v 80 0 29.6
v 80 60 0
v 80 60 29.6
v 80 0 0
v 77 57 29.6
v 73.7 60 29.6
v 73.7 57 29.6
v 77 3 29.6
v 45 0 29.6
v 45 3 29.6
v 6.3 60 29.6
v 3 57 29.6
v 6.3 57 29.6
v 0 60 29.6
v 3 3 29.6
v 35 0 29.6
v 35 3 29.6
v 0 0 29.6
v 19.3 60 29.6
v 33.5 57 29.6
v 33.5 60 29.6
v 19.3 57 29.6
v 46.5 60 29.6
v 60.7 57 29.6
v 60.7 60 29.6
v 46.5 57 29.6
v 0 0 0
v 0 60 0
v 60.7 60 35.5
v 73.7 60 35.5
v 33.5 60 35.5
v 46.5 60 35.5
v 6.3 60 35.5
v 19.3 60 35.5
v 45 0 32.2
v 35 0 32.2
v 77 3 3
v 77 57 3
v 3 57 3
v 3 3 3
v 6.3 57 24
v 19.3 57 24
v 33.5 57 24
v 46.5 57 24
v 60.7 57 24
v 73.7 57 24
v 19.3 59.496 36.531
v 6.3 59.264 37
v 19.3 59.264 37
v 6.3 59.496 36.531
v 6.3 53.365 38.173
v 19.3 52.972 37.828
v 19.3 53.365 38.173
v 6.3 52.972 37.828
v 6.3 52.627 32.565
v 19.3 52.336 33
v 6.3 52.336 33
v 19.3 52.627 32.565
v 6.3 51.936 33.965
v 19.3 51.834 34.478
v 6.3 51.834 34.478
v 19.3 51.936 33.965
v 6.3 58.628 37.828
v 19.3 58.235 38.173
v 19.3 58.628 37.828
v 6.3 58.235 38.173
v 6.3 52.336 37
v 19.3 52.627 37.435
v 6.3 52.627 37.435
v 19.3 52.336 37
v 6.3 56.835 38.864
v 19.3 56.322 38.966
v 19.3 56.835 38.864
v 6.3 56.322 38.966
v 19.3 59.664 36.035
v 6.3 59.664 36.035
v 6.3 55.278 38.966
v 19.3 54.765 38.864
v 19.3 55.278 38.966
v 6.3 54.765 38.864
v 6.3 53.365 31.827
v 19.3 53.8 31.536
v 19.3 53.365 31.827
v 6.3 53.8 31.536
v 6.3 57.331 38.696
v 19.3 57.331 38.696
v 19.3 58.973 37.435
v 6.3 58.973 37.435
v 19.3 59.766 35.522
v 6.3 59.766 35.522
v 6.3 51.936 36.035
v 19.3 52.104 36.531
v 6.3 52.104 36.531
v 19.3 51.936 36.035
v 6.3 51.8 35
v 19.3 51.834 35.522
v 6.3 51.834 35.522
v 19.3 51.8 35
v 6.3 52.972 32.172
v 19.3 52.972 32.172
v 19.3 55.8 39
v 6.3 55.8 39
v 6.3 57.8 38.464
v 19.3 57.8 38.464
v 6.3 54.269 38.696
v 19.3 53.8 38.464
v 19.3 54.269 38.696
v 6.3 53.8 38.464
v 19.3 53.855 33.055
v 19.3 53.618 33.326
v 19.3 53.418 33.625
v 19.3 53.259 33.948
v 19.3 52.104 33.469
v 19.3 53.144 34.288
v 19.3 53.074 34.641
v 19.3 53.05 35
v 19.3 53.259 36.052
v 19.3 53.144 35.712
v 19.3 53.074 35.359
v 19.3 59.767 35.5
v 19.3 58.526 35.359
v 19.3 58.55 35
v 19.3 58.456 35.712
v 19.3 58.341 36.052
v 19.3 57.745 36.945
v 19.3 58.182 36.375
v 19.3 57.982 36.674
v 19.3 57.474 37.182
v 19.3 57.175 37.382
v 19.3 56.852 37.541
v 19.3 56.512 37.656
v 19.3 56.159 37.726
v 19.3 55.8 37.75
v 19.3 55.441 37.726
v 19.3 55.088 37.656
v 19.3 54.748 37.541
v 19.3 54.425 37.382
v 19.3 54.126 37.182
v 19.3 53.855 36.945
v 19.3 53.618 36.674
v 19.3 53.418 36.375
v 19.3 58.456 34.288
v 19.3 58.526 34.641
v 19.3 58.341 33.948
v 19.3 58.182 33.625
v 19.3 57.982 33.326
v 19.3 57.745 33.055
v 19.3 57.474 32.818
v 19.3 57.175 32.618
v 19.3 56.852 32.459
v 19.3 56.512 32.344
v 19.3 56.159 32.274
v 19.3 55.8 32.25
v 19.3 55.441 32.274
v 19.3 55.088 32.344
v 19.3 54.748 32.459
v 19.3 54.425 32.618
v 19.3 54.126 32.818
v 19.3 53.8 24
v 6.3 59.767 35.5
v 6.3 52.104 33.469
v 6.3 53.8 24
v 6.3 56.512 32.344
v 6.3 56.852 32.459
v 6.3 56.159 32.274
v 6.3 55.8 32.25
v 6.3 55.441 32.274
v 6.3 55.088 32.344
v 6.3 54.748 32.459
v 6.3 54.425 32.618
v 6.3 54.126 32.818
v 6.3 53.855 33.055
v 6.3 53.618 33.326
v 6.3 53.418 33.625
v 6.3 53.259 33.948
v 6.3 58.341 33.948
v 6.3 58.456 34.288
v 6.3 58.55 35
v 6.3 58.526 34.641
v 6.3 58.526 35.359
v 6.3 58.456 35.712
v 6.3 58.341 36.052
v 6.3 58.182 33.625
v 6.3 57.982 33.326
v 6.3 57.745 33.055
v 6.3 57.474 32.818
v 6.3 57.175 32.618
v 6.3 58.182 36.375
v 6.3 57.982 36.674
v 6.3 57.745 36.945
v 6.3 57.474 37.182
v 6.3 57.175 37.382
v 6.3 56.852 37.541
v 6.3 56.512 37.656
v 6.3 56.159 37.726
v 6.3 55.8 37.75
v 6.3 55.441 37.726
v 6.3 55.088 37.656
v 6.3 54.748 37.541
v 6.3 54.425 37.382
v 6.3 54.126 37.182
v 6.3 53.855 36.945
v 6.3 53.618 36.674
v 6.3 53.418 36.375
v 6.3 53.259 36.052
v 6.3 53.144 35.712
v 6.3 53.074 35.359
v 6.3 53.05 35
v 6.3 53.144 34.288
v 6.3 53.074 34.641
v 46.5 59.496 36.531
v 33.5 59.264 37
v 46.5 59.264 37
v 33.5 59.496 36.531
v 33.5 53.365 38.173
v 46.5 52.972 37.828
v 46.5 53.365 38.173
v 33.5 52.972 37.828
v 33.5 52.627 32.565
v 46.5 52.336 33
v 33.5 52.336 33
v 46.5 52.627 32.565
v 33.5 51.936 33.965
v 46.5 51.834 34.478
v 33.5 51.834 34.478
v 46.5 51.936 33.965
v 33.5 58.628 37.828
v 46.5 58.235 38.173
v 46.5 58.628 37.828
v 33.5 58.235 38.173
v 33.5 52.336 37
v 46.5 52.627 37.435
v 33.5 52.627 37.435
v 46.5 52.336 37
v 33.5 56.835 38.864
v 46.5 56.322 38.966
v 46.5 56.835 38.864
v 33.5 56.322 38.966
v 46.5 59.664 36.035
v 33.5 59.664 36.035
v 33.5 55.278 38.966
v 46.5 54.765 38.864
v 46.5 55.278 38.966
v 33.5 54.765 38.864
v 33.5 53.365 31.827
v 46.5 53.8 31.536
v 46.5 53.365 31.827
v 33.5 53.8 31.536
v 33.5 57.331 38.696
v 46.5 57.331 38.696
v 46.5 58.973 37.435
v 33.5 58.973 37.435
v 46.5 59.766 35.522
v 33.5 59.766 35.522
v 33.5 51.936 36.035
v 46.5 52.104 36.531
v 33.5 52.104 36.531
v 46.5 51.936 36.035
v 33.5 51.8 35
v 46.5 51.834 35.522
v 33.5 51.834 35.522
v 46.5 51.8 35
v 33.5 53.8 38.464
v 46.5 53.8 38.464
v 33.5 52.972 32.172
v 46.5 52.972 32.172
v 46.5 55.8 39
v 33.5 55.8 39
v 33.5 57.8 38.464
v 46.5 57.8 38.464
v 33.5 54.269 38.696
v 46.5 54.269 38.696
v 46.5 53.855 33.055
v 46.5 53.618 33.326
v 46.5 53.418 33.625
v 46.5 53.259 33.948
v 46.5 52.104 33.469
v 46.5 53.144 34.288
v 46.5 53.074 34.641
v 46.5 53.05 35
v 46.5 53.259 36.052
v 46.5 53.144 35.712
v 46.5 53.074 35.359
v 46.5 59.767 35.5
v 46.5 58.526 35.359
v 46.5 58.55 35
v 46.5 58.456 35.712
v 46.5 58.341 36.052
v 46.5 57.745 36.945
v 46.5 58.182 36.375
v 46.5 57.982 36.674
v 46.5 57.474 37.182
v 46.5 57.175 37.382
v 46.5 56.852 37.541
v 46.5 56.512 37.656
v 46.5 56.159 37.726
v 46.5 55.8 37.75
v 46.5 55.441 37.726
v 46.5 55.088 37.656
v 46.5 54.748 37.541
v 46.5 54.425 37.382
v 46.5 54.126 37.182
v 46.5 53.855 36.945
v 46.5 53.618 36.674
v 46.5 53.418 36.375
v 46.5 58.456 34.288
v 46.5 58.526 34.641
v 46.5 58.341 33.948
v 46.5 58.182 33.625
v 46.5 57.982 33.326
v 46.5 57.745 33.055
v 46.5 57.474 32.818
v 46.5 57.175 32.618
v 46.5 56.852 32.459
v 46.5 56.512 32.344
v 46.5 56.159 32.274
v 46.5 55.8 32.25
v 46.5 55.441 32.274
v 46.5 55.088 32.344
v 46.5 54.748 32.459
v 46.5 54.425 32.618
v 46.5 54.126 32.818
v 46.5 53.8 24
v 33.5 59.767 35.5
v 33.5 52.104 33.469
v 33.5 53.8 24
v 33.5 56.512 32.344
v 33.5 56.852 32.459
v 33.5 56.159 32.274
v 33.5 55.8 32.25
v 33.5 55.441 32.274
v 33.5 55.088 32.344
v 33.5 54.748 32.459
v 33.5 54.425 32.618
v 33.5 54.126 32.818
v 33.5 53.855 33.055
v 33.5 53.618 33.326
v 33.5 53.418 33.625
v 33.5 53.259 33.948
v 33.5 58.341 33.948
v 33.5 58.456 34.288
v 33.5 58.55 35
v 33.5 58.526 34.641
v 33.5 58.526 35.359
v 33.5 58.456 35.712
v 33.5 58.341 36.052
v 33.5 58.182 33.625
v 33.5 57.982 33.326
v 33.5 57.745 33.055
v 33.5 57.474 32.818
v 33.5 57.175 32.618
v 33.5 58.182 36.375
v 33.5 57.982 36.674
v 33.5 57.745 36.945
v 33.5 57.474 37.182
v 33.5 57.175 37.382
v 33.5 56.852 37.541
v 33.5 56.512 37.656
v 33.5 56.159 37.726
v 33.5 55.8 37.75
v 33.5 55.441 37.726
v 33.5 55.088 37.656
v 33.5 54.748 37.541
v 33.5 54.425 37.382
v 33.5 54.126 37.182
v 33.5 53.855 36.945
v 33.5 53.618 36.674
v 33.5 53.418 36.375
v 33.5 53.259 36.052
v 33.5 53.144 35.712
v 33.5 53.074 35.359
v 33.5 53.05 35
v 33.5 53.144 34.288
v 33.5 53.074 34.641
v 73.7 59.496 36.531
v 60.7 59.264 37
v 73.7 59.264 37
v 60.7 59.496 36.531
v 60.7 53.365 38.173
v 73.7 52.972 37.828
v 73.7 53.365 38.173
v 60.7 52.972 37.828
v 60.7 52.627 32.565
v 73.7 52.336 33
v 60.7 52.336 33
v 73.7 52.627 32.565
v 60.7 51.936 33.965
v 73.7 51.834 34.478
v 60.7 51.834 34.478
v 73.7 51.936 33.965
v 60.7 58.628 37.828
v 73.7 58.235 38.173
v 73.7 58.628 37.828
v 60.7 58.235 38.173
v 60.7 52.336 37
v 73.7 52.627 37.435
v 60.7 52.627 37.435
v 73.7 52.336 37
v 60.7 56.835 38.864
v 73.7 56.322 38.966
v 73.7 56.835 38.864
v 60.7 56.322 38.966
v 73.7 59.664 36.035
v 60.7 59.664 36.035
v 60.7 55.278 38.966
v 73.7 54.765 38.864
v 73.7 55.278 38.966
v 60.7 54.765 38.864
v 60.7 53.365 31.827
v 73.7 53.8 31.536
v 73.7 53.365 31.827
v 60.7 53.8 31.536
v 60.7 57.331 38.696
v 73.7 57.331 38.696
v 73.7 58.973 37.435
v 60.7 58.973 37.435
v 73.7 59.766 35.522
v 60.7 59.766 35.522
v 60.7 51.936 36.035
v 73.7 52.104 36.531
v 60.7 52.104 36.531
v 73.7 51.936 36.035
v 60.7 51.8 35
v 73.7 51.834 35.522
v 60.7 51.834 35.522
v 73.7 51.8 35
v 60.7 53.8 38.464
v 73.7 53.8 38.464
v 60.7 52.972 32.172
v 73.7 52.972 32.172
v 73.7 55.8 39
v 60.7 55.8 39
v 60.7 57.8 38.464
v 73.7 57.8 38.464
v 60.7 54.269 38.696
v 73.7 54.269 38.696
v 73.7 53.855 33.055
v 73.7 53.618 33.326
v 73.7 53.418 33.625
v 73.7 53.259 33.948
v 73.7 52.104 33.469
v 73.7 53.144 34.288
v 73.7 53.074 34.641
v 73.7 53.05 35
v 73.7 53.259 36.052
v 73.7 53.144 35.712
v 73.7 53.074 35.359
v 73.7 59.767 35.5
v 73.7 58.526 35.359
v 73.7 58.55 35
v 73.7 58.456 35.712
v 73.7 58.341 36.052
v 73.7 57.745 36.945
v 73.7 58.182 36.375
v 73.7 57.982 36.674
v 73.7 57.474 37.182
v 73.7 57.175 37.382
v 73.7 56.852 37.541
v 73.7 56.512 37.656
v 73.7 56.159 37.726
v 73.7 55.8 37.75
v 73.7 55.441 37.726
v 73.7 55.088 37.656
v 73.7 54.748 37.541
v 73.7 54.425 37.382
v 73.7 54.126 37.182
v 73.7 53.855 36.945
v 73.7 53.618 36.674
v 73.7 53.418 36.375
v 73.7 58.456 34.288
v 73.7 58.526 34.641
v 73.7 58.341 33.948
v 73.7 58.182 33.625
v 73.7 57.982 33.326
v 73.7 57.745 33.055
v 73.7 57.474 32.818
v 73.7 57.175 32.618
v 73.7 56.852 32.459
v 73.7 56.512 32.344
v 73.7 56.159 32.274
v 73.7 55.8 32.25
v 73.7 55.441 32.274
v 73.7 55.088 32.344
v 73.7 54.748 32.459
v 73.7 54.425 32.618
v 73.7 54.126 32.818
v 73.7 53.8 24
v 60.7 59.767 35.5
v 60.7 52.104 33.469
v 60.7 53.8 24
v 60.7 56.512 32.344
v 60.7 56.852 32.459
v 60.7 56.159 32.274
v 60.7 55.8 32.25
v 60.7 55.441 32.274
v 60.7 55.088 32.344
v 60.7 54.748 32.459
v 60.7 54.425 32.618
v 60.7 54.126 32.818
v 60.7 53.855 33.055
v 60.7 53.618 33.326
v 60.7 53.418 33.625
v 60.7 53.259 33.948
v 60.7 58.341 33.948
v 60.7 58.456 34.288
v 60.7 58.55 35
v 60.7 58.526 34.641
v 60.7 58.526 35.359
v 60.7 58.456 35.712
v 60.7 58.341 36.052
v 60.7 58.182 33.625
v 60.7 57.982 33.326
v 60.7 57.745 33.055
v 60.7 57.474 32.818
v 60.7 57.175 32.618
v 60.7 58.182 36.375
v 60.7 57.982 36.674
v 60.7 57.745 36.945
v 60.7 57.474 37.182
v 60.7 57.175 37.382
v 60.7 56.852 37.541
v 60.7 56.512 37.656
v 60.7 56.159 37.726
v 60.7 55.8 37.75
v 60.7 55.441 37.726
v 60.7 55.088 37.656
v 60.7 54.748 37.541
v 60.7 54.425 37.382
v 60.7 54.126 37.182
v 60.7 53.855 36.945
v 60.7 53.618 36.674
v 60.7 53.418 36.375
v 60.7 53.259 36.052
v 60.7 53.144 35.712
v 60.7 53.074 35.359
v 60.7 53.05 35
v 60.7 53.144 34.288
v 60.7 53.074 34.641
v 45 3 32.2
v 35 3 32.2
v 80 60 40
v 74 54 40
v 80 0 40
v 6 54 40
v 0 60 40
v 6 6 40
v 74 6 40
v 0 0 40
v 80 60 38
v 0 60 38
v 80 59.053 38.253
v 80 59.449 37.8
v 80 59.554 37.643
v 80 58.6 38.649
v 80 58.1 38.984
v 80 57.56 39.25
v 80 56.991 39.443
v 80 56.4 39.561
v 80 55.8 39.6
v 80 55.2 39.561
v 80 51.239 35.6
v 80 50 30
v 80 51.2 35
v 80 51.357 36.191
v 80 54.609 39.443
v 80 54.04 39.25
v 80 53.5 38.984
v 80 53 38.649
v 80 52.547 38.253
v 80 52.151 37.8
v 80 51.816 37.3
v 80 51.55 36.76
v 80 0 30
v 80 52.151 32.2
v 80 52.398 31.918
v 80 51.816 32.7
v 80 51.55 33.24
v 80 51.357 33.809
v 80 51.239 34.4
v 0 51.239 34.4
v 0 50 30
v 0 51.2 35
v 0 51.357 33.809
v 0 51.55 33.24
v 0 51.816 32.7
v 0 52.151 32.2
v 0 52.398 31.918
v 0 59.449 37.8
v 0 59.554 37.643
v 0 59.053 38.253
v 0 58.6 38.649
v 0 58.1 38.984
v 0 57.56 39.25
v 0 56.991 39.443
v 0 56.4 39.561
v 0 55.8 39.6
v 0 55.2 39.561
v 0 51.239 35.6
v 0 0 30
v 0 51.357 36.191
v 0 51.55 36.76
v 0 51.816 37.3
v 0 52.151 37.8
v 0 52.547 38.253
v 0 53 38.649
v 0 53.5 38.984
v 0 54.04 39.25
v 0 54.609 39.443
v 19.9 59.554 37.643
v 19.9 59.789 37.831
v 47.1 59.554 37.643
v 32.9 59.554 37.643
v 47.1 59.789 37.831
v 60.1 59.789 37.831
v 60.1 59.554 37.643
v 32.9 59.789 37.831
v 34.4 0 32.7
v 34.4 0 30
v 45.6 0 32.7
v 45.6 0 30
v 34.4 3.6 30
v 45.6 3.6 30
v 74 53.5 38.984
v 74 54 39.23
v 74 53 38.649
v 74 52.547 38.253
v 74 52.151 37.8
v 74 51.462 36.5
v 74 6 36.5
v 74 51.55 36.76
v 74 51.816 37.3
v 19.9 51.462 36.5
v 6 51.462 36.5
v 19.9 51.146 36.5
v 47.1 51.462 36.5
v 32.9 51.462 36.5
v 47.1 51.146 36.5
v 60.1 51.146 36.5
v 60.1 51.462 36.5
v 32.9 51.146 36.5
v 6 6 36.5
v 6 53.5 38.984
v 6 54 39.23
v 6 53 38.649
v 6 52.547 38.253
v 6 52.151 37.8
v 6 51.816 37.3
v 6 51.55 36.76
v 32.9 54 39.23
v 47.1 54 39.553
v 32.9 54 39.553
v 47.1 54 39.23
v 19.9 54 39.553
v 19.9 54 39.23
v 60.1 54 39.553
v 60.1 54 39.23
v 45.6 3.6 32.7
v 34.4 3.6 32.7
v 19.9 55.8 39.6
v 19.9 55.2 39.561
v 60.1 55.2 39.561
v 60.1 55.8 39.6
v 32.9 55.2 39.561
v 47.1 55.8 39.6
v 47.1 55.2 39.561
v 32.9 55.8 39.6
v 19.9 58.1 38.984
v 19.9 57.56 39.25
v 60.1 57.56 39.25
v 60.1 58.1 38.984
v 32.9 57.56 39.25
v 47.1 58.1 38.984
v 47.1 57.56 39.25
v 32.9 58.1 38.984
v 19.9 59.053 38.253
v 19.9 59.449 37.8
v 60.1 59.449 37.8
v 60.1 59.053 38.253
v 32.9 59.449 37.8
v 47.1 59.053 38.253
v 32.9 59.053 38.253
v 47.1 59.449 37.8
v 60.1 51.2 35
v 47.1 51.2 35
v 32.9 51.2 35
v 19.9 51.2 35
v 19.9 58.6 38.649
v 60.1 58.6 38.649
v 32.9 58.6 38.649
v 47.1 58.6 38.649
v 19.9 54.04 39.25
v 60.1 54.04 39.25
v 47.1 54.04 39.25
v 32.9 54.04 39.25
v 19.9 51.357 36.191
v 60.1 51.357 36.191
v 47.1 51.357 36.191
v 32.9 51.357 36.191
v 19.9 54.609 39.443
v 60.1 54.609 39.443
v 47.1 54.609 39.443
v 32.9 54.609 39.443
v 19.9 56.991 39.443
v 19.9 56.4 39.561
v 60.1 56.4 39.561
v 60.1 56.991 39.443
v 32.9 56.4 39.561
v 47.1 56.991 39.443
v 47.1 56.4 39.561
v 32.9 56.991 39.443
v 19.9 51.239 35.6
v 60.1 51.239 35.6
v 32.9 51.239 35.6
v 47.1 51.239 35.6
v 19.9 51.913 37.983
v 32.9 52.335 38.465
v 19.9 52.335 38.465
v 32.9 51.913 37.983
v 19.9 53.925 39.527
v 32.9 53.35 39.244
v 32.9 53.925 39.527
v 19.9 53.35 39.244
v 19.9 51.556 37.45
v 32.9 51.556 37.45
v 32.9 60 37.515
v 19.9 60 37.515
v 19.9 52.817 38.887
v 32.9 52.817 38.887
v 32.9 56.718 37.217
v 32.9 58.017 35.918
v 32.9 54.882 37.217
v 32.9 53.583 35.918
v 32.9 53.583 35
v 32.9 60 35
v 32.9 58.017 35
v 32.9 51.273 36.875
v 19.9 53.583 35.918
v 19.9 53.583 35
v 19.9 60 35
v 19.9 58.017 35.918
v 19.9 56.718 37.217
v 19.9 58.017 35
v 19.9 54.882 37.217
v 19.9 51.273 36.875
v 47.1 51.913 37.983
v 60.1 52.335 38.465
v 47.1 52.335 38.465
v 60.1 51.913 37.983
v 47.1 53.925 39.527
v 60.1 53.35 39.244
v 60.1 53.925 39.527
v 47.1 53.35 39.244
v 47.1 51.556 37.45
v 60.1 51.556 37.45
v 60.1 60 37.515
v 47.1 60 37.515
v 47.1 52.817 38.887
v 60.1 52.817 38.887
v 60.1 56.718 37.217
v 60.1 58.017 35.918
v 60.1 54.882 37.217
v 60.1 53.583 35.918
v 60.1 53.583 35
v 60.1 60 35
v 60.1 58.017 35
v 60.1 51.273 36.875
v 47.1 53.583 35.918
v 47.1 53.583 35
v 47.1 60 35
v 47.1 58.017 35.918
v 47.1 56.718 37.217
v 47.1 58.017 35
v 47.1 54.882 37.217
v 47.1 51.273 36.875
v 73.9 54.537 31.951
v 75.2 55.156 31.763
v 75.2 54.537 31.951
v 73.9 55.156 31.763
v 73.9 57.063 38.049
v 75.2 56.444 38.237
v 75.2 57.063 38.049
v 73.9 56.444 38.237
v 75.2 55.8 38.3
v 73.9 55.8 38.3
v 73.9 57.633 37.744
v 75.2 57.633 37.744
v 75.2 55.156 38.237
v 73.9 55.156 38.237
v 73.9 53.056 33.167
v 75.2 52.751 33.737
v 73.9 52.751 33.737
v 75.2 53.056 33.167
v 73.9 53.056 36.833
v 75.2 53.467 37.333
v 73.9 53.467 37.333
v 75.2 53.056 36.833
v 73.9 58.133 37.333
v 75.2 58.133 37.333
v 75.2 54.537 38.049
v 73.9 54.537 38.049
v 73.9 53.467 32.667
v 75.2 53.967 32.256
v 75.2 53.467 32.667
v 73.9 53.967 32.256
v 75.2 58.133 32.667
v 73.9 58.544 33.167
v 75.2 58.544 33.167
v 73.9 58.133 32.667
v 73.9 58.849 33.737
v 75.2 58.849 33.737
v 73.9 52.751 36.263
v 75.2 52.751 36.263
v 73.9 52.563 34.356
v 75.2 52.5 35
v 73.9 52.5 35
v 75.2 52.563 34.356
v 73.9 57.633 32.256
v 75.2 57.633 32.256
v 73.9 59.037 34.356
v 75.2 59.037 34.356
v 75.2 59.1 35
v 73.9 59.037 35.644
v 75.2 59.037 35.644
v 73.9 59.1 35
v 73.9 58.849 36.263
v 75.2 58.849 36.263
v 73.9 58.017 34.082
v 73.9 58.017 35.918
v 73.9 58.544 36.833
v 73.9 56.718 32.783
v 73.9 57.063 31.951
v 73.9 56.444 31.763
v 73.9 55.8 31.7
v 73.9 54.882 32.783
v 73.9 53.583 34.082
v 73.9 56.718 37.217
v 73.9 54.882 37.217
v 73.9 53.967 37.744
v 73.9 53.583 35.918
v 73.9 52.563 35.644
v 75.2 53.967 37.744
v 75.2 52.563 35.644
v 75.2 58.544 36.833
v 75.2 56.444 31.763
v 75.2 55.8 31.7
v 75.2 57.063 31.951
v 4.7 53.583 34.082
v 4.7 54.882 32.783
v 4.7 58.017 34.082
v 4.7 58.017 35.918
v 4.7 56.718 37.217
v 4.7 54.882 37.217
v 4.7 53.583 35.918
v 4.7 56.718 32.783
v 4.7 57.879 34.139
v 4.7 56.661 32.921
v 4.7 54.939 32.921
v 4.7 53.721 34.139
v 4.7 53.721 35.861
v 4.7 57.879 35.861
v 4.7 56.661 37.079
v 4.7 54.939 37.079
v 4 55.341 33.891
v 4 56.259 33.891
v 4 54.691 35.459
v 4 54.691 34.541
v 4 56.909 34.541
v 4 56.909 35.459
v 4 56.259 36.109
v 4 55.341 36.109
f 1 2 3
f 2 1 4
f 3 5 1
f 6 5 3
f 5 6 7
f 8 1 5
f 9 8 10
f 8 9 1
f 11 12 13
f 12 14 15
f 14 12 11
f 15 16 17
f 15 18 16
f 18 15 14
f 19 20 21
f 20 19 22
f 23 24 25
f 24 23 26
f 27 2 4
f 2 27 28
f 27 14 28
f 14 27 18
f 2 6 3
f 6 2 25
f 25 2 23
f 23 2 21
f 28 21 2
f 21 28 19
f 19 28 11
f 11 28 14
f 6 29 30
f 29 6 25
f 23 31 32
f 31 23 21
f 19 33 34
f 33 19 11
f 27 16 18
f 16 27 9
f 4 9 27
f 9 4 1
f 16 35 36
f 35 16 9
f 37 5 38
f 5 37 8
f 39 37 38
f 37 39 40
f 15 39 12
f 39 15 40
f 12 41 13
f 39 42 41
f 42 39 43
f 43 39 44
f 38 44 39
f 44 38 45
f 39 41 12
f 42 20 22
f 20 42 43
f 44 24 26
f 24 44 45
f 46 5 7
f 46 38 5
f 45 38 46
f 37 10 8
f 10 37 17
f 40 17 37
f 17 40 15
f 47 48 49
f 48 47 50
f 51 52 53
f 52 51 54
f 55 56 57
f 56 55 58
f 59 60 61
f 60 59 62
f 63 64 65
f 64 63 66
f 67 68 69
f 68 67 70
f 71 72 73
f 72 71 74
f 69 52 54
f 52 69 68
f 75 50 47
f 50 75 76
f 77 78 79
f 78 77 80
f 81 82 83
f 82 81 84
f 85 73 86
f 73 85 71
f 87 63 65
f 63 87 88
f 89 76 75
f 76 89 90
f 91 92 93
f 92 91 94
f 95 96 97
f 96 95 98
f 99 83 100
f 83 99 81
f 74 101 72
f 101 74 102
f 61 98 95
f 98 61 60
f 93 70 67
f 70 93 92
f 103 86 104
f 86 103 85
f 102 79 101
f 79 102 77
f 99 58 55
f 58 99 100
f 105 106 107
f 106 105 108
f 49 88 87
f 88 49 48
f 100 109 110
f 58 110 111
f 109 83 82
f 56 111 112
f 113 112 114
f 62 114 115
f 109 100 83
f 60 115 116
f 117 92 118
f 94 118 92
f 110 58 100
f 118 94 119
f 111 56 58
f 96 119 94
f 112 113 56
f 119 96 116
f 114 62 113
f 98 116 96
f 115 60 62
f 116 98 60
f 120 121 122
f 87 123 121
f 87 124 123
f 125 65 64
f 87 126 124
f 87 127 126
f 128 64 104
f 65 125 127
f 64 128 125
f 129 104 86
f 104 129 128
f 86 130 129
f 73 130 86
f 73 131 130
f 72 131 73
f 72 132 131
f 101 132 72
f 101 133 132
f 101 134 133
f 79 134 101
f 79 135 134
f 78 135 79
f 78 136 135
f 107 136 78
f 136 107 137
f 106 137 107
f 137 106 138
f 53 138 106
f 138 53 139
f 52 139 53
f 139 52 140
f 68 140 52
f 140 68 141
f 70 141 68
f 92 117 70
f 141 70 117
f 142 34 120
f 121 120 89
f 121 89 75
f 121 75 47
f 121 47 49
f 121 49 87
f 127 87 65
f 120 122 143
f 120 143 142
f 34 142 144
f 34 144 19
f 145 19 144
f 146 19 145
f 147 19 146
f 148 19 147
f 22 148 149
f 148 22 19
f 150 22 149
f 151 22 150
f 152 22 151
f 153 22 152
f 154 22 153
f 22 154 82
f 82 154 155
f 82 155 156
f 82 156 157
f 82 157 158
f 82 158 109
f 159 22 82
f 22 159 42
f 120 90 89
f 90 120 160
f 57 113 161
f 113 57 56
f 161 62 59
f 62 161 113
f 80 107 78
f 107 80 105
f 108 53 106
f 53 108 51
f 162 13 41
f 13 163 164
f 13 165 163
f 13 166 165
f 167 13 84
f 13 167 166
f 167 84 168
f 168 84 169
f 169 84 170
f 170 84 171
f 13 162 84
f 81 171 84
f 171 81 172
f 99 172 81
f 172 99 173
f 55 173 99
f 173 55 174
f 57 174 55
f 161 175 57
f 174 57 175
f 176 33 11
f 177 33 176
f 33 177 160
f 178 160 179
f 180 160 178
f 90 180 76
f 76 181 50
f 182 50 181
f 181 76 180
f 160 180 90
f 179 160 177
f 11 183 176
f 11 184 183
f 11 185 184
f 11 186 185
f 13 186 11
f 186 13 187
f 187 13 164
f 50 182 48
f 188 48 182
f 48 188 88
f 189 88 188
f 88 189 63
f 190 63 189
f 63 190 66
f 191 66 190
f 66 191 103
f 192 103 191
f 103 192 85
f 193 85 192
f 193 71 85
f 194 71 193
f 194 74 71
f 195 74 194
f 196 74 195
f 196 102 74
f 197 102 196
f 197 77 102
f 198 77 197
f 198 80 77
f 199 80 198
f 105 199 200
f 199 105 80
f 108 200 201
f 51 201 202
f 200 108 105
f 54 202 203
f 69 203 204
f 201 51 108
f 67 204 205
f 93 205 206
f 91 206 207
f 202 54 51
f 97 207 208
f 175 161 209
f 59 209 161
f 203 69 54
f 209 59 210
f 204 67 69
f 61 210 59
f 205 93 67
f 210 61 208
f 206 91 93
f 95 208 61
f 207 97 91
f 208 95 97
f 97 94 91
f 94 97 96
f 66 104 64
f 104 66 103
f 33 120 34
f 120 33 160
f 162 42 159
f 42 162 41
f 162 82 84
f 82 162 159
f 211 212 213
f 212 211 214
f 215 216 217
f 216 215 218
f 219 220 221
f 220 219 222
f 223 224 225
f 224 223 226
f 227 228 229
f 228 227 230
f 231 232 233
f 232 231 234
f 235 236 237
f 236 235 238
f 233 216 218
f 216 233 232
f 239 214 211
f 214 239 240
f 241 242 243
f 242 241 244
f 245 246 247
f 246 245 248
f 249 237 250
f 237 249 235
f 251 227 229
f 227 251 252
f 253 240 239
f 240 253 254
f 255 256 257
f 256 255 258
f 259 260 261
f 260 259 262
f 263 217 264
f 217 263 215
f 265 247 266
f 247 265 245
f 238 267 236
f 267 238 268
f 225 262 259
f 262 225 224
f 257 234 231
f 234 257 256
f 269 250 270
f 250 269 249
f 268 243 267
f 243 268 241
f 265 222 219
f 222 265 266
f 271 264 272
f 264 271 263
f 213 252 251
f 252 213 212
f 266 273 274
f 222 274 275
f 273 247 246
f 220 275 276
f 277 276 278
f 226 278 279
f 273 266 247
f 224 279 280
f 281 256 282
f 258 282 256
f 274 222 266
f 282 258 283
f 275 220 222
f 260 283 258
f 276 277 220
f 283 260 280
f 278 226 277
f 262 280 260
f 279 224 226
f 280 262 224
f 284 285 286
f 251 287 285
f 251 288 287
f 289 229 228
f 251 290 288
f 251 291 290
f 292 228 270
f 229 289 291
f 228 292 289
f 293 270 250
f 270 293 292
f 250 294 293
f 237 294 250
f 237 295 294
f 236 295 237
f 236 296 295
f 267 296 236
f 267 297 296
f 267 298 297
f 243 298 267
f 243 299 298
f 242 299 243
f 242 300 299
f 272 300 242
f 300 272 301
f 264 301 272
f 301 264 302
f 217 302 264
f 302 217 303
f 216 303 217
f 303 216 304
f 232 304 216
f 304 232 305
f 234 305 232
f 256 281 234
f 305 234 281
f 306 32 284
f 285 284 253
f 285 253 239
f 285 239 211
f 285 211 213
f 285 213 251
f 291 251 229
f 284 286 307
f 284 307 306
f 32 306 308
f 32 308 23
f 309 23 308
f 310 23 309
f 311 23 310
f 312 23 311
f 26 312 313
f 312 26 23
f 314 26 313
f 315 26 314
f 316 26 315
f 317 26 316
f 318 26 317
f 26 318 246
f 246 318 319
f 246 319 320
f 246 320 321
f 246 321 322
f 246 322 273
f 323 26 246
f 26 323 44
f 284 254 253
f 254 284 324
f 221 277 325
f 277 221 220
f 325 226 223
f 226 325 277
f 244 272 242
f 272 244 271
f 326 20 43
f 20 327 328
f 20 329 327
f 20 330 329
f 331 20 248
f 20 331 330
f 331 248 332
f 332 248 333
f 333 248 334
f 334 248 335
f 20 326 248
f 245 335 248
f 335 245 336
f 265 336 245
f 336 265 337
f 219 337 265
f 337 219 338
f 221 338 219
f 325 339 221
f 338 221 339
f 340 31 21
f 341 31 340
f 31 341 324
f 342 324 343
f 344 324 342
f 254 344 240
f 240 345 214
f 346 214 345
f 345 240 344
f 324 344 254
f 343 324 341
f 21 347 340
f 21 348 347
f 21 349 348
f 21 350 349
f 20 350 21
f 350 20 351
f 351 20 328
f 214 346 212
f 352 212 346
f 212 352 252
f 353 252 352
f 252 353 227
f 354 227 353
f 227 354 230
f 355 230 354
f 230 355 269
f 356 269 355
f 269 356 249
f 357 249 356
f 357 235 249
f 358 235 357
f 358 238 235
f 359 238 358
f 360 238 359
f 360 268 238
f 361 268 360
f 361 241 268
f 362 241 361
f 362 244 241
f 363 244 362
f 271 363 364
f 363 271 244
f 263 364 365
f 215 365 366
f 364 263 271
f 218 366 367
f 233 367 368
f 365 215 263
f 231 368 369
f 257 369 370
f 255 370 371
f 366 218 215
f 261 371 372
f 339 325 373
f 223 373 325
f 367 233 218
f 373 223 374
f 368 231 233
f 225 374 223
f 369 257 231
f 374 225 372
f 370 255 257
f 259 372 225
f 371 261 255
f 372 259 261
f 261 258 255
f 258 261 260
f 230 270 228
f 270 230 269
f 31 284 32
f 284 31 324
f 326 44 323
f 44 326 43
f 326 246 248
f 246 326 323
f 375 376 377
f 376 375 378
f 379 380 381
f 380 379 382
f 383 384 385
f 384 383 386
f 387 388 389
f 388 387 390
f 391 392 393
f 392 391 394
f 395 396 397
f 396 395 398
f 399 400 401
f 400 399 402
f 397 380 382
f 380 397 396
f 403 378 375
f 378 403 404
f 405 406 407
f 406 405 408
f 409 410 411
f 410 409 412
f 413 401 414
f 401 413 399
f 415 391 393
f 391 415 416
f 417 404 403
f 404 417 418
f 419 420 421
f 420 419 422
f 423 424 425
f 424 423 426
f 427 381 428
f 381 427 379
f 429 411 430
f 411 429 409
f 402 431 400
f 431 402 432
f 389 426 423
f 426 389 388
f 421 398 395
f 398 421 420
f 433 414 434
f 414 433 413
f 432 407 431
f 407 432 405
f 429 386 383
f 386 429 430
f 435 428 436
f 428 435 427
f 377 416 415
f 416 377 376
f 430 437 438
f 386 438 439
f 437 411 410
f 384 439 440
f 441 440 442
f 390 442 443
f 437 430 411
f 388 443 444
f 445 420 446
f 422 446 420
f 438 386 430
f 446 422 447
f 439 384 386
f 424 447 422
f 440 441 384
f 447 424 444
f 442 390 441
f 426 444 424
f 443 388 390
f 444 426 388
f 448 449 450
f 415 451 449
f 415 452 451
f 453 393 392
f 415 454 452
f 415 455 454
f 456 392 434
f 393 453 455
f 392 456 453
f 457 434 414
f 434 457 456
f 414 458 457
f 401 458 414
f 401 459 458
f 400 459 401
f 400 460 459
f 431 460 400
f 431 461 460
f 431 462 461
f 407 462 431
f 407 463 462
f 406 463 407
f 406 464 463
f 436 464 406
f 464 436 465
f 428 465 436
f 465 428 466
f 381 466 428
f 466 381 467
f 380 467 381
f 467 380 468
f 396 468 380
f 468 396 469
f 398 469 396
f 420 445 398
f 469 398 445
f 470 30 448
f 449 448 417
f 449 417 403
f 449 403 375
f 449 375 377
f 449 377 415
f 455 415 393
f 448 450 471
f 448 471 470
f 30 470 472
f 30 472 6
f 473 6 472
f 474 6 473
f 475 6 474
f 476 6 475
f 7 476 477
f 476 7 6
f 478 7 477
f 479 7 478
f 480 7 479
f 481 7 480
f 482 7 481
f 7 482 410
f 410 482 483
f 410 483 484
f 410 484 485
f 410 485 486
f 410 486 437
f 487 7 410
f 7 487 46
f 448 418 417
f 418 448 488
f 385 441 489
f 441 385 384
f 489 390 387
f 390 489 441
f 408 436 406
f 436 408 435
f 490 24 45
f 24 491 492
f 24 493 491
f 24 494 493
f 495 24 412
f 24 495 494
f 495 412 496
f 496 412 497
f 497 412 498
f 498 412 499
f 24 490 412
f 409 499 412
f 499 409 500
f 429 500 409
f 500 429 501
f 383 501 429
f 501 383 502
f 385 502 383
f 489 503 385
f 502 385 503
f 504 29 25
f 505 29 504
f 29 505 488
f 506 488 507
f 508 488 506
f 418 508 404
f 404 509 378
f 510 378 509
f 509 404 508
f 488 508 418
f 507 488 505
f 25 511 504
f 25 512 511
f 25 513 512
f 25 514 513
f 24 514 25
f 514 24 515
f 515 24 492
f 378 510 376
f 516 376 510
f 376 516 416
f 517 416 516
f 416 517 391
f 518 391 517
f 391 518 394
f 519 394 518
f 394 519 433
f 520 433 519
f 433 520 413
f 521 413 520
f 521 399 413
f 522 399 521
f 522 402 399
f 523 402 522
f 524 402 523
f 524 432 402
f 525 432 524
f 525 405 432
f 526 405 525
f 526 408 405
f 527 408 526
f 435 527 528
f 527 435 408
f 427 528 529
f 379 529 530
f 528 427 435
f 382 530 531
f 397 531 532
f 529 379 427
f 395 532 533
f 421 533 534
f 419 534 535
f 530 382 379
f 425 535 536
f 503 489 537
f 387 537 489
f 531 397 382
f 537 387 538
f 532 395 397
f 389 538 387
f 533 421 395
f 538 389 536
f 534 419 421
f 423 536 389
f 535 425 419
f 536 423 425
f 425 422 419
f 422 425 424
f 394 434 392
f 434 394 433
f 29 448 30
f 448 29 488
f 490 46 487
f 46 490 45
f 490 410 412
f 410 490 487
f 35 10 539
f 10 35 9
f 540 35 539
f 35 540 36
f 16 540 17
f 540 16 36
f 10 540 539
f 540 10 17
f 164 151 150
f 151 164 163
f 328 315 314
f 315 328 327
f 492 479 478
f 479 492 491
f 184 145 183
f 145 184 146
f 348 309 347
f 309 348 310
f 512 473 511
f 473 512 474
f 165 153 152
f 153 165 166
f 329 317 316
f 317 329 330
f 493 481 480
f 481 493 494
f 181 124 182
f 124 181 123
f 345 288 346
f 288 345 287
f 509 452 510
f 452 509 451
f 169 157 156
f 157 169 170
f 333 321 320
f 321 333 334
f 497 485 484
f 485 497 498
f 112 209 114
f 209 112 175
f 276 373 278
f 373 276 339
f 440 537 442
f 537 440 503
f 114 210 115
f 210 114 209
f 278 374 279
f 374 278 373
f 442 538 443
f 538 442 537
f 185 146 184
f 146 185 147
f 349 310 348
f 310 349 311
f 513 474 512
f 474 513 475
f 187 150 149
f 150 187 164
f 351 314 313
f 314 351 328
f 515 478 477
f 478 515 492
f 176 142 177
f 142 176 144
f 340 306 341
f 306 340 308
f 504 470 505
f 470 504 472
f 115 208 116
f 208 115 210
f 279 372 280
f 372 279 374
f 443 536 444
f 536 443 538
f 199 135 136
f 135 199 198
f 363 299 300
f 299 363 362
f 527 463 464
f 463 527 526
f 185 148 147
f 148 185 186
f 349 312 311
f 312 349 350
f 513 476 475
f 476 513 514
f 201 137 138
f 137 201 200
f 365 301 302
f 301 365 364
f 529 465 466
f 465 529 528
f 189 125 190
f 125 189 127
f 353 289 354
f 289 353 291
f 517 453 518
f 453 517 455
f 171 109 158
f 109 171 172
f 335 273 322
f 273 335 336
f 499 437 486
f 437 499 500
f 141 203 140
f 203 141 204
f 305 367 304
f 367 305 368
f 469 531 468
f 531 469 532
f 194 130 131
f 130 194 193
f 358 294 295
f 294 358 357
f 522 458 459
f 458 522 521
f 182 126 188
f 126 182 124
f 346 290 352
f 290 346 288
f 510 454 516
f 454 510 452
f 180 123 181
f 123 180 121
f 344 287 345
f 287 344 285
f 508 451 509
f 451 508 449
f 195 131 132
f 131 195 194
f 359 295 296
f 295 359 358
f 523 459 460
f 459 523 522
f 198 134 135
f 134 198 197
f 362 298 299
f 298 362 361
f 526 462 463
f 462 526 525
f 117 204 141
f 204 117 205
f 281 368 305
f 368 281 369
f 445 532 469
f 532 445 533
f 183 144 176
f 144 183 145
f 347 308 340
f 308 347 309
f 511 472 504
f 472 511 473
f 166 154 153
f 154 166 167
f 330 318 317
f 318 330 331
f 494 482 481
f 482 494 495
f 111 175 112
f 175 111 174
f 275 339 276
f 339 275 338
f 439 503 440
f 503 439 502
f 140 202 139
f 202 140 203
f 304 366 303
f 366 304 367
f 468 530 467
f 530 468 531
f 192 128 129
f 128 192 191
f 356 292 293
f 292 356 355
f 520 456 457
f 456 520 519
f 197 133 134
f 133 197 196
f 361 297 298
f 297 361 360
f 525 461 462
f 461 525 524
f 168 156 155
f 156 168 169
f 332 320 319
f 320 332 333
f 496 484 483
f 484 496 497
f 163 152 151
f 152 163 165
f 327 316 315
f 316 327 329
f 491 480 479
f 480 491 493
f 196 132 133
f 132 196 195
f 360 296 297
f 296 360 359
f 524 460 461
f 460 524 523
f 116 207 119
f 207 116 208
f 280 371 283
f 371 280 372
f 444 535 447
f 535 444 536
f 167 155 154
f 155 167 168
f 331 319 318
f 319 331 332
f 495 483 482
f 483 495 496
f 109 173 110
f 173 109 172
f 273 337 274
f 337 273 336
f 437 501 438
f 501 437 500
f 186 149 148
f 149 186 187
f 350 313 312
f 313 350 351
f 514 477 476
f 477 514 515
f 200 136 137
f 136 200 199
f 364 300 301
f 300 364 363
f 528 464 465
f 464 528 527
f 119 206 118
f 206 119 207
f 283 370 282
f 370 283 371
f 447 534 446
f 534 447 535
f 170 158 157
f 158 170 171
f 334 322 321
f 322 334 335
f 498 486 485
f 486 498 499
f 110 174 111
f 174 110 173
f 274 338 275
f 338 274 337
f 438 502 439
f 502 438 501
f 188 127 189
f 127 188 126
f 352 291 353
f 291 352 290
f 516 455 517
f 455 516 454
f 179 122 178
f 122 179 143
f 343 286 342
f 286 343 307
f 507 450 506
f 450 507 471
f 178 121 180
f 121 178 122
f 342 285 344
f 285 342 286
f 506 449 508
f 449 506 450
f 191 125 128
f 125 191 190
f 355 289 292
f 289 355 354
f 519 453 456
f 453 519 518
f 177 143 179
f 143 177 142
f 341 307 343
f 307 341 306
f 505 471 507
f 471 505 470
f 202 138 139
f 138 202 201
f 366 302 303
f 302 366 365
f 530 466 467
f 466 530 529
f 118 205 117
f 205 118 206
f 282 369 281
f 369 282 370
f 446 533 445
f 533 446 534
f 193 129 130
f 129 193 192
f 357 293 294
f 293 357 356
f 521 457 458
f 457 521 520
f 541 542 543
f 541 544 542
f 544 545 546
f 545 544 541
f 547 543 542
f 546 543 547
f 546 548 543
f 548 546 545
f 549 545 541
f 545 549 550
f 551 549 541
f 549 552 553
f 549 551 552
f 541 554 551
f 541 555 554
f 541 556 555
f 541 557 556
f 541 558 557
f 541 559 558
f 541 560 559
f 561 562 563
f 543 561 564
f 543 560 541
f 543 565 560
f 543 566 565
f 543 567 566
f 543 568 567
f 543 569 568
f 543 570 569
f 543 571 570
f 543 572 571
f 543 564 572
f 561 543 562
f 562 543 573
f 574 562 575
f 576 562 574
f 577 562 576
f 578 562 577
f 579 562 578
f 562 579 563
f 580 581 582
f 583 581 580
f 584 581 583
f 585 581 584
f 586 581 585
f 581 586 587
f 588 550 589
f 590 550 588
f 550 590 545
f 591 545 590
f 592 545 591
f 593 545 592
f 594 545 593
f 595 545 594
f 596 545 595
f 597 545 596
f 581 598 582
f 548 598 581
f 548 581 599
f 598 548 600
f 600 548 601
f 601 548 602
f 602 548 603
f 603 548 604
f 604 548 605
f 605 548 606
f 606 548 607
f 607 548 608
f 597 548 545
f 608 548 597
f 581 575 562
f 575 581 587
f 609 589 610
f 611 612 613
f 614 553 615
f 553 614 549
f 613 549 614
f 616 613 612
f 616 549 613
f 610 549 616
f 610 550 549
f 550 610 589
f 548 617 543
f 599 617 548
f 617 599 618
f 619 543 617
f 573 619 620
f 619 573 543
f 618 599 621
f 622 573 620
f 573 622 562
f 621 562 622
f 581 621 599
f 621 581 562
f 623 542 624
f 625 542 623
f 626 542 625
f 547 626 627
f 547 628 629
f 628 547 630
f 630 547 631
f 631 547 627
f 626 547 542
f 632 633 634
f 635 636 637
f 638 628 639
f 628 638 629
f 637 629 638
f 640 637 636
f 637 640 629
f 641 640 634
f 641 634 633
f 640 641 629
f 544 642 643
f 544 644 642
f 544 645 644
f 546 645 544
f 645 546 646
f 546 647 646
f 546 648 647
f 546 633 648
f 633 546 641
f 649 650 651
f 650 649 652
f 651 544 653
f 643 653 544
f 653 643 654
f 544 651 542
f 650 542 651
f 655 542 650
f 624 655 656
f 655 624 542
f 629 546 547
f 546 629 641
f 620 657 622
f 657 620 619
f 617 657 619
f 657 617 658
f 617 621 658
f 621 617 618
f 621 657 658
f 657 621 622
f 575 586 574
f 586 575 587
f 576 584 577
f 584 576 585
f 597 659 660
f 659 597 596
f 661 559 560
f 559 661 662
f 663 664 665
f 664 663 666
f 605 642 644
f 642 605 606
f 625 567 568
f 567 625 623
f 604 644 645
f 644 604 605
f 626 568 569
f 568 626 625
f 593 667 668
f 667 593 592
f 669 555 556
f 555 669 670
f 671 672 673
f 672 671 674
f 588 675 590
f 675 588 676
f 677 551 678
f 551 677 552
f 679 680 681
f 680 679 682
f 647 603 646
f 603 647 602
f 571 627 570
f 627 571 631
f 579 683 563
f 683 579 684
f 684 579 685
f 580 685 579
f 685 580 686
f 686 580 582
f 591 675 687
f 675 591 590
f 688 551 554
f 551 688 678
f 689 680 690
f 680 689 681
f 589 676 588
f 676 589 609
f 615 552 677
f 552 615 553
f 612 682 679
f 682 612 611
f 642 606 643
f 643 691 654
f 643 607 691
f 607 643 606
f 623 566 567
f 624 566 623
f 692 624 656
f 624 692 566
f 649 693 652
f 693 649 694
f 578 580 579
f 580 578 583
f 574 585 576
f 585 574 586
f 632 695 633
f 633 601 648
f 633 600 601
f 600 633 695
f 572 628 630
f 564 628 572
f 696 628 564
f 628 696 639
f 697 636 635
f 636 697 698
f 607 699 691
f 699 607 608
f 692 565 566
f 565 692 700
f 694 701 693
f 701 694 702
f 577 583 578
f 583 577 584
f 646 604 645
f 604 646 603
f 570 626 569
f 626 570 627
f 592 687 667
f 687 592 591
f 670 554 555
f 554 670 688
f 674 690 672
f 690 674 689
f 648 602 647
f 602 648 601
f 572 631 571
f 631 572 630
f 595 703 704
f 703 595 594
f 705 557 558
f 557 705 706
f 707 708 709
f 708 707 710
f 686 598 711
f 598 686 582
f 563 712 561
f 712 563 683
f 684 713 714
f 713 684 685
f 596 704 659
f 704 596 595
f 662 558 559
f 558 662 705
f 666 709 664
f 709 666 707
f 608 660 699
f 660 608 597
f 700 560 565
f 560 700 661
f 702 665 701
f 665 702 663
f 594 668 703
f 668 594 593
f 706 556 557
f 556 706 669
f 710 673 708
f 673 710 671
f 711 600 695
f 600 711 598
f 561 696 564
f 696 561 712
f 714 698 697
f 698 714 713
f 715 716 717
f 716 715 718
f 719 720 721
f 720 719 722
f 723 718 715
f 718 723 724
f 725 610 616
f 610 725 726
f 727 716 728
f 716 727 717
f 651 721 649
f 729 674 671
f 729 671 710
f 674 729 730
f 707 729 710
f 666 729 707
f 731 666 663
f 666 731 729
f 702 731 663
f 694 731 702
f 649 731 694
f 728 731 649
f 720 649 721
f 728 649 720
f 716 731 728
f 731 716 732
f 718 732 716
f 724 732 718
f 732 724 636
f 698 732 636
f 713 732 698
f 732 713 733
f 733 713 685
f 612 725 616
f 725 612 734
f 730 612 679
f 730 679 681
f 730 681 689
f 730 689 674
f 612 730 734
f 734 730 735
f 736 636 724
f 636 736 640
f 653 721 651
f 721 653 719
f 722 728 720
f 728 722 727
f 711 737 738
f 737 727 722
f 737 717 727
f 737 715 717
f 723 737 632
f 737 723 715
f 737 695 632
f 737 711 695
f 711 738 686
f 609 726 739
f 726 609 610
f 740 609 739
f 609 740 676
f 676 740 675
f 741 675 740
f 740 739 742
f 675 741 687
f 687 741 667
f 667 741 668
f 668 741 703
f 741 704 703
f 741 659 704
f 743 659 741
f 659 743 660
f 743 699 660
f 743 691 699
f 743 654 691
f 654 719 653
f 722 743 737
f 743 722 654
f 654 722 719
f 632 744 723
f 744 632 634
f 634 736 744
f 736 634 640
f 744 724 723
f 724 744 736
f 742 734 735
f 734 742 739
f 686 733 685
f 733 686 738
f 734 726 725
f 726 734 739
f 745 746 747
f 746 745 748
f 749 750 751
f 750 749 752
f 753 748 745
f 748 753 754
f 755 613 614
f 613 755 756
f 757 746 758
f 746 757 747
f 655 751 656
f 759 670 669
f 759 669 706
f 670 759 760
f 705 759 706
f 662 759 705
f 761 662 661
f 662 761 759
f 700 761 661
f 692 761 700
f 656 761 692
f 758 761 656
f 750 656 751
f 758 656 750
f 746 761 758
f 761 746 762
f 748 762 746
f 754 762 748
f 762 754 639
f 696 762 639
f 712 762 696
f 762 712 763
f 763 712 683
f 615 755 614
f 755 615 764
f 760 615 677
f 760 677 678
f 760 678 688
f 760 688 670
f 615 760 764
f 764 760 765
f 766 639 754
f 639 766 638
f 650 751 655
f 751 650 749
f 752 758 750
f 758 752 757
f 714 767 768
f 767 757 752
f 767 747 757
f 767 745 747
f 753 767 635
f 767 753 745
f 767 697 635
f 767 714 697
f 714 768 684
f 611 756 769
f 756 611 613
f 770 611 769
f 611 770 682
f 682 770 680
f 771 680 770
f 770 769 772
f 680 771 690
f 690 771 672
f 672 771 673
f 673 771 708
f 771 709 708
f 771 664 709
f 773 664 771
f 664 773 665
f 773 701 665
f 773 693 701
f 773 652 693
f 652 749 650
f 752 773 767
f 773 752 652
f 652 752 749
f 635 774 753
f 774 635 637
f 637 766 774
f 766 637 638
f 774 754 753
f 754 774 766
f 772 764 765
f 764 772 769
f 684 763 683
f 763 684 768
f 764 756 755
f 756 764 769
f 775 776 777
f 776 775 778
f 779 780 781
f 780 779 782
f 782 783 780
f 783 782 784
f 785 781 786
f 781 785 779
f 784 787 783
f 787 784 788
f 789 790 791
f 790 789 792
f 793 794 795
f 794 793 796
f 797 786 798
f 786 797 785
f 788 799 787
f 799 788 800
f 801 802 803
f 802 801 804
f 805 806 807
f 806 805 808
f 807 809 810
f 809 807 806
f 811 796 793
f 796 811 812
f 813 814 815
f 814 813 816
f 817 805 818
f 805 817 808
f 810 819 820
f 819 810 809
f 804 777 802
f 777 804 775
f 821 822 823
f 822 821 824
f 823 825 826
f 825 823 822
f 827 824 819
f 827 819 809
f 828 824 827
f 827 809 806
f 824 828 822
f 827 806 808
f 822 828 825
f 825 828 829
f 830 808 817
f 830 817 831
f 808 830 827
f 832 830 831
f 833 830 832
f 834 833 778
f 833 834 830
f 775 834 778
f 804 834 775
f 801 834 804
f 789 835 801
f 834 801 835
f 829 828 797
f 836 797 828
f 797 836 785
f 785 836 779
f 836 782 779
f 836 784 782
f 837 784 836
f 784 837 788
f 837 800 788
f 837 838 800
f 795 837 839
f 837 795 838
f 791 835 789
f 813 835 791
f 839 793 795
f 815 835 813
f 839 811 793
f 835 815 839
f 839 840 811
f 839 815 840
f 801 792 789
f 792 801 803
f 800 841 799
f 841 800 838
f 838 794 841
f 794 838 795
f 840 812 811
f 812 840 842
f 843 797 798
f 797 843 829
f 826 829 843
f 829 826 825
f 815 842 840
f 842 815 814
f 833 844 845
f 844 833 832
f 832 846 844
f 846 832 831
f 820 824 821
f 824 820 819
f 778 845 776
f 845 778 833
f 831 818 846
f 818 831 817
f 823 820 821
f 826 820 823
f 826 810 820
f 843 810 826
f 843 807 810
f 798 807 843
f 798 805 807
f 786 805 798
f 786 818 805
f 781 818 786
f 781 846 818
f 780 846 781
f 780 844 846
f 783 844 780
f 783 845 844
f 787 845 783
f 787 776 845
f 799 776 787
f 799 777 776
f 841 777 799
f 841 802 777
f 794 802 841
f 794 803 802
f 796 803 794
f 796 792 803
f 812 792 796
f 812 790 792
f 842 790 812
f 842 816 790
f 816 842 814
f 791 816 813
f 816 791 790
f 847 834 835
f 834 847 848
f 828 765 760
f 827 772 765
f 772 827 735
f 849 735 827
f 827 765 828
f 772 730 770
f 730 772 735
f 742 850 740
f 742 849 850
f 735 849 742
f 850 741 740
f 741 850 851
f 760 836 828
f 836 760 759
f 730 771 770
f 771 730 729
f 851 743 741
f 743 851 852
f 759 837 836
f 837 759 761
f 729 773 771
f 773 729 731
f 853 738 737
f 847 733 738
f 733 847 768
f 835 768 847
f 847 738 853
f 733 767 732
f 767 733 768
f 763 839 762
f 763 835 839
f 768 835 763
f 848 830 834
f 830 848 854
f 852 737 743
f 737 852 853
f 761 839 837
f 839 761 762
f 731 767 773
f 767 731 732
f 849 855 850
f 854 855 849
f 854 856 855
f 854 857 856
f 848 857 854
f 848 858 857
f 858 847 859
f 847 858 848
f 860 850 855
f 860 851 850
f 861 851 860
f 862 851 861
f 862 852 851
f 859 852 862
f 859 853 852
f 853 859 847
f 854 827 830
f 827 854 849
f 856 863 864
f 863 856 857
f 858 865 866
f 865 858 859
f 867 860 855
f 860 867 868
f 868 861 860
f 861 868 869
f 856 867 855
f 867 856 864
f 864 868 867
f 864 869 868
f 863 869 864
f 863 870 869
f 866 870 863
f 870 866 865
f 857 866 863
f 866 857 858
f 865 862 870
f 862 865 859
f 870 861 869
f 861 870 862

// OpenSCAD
// Print-in-place hinged box, 80 x 60 x 40 mm closed.
// Printed closed in PLA (Bambu A1, 0.4 nozzle): base, lid and a captive
// hinge pin are separate bodies with 0.35-0.6 mm clearances, so the hinge
// breaks free by hand.  No supports: the lid underside bridges the cavity,
// the hinge barrels/pin use faceted (octagonal) lower surfaces, and all
// other downward faces are short bridges or rest on the body below.

/* [Part] */
part = "assembly"; // [assembly, box, lid, pin]

/* [Dimensions] */
box_w = 80;          // X, outside
box_d = 60;          // Y, outside (front y=0, back y=60)
box_h = 29.6;        // base height to its rim
lid_h = 10;          // lid height; lid bottom at z=30 (0.4 gap)
lid_z = 30;
wall = 3;
floor_t = 3;
total_h = 40;

hinge_y = 55.8;      // hinge axis, assembly coords
hinge_z = 35;
barrel_r = 4.0;
pin_r = 2.4;         // octagon circumradius
bore_r = 2.75;       // pin_r + 0.35 radial clearance
relief_r = 4.6;      // barrel_r + 0.6

// Alternating knuckles along the back edge (x intervals), 0.6 mm end gaps.
box_segs  = [[6.3, 19.3], [33.5, 46.5], [60.7, 73.7]];
lid_segs  = [[19.9, 32.9], [47.1, 60.1]];

cadverify_only = "";
module instance(name, part_name, unit = 1) {
    echo(cadverify_instance = [name, part_name, unit]);
    if (cadverify_only == "" || cadverify_only == name) children();
}

// ---------------------------------------------------------------- base (box)
module box_main() {
    difference() {
        union() {
            // shell: outer block minus open-top cavity
            difference() {
                cube([box_w, box_d, box_h]);
                translate([wall, wall, floor_t]) cube([box_w - 2 * wall, box_d - 2 * wall, box_h]);
            }
            // hinge knuckles (base) + support posts down to the back wall
            for (s = box_segs) {
                translate([s[0], hinge_y, hinge_z]) rotate([0, 90, 0])
                    cylinder(h = s[1] - s[0], r = barrel_r, $fn = 48);
                translate([s[0], 53.8, 24]) cube([s[1] - s[0], 6.2, 11.5]);
            }
            // front catch tooth (enters the socket in the lid)
            translate([35, 0, box_h]) cube([10, wall, 2.6]);
        }
        // pin bore through the base knuckles
        translate([-1, hinge_y, hinge_z]) rotate([0, 90, 0])
            cylinder(h = box_w + 2, r = bore_r, $fn = 48);
    }
}

// ---------------------------------------------------------------- lid (local: z 0..10, hinge axis at z=5)
module lid_main() {
    union() {
        difference() {
            union() {
                // main slab, side profile (Y-Z) extruded along X.
                // Rear lower edge chamfered 50,0 -> 60,8 so the slab
                // swings clear of the base back wall.
                rotate([0, 90, 0])
                    linear_extrude(height = box_w)
                        polygon(points = [[0, 0], [0, 50], [-8, 60], [-10, 60], [-10, 0]]);
                // hinge knuckles (lid)
                for (s = lid_segs)
                    translate([s[0], hinge_y, 5]) rotate([0, 90, 0])
                        cylinder(h = s[1] - s[0], r = barrel_r, $fn = 48);
            }
            // recessed panel in the top face
            translate([6, 6, 6.5]) cube([68, 48, 4]);
            // front catch socket (tooth: x35..45, z assy 29.6..32.2)
            translate([34.4, -1, -0.5]) cube([11.2, 4.6, 3.2]);
            // clearance tunnel for the base knuckles / pin
            translate([-1, hinge_y, 5]) rotate([0, 90, 0])
                cylinder(h = box_w + 2, r = relief_r, $fn = 48);
            // pin bore through the lid knuckles
            translate([-1, hinge_y, 5]) rotate([0, 90, 0])
                cylinder(h = box_w + 2, r = bore_r, $fn = 48);
        }
        // webs joining lid knuckles to the slab: upper half-discs r=4.9
        // (stay above z=30.1 in assembly, clear of the base rim at 29.6)
        for (s = lid_segs)
            intersection() {
                translate([s[0], hinge_y, 5]) rotate([0, 90, 0])
                    cylinder(h = s[1] - s[0], r = 4.9, $fn = 48);
                translate([s[0], hinge_y - 10, 5]) cube([s[1] - s[0], 20, 5]);
                translate([s[0], 0, 0]) cube([s[1] - s[0], box_d, lid_h]);
            }
    }
}

// ---------------------------------------------------------------- pin
// Centred on its axis, local +Z from head (z=0) to tip (z=71.2).
module pin_geom() {
    union() {
        cylinder(h = 1.3, r = 3.3, $fn = 32);                    // head
        translate([0, 0, 1.0]) rotate([0, 0, 22.5])
            cylinder(h = 69.5, r = pin_r, $fn = 8);              // octagonal shaft
        translate([0, 0, 70.4]) rotate([0, 0, 22.5])
            cylinder(h = 0.8, r1 = pin_r, r2 = 1.2, $fn = 8);    // lead-in tip
    }
}
module pin_part() { translate([3.3, 3.3, 0]) pin_geom(); }

// ---------------------------------------------------------------- output
if (part == "box") {
    echo(cadverify_spec = [
        ["bounds", [[0, 0, 0], [box_w, box_d, hinge_z + barrel_r]]],
        ["bodies", 1],
        ["copies", 1],
        ["support_faces", [["bed", "-z", 4000]]],
        ["overhangs_allowed", [["hinge knuckles and pin bore print in place; faceted bore ceiling is a short internal bridge", [[5, 51, 30], [75, 60, 39.5]]]]],
        ["details", [
            ["cavity", "void", [[4, 4, 10], [76, 53, 29]], 0.95],
            ["front_wall", "thickness", [40, -1, 15], [0, 1, 0], 3],
            ["floor", "thickness", [40, 30, -1], [0, 0, 1], 3],
            ["box_knuckle", "material", [[7, 52, 33.5], [18, 53.8, 36.5]], 0.85],
            ["pin_bore", "void", [[8, 54.9, 34.1], [17, 56.7, 35.9]], 0.9],
            ["catch_tooth", "material", [[36, 0.5, 30], [44, 2.5, 32]], 0.85],
            ["hinge_knuckles", "view", [[4, 50, 28], [76, 60, 39.5]]]
        ]]
    ]);
    box_main();
} else if (part == "lid") {
    echo(cadverify_spec = [
        ["bounds", [[0, 0, 0], [box_w, box_d, lid_h]]],
        ["bodies", 1],
        ["copies", 1],
        ["support_faces", [["print_face", "-z", 3000]]],
        ["overhangs_allowed", [["lid knuckle bores print in place around the pin; bore ceilings are short internal bridges", [[5, 51, 0], [75, 60, 10]]]]],
        ["details", [
            ["top_pocket", "void", [[7, 7, 6.6], [73, 53, 9.9]], 0.95],
            ["lid_slab", "thickness", [40, 30, 9], [0, 0, -1], 6.5],
            ["lid_knuckle", "material", [[21, 52, 3.5], [32, 53.8, 6.5]], 0.85],
            ["pin_bore", "void", [[22, 55, 4.2], [31, 56.6, 5.8]], 0.9],
            ["catch_socket", "void", [[35, 0.5, 0.2], [45, 2.5, 2.5]], 0.9],
            ["hinge_knuckles", "view", [[4, 50, 0], [76, 60, 10]]]
        ]]
    ]);
    lid_main();
} else if (part == "pin") {
    echo(cadverify_spec = [
        ["bounds", [[0, 0, 0], [6.6, 6.6, 71.2]]],
        ["bodies", 1],
        ["copies", 1],
        ["support_faces", [["head_base", "-z", 30]]],
        ["overhangs_allowed", []],
        ["details", [
            ["pin_shaft", "material", [[2, 2, 10], [4.6, 4.6, 20]], 0.9],
            ["pin_head", "material", [[1, 1, 0.1], [5.6, 5.6, 1.2]], 0.75],
            ["pin_length", "thickness", [1.2, 3.3, 72], [0, 0, -1], 71.2],
            ["pin_head_view", "view", [[0, 0, 0], [6.6, 6.6, 2]]]
        ]]
    ]);
    pin_part();
} else if (part == "assembly") {
    echo(cadverify_spec = [
        ["bounds", [[0, 0, 0], [box_w, box_d, total_h]]],
        ["support_faces", [["bed", "-z", 4000]]],
        ["allowed_interferences", []],
        ["motions", [
            ["lid_swing", ["lid"], "rotate", [0, hinge_y, hinge_z], [-1, 0, 0], [0, 110]]
        ]],
        ["assembly_order", [
            [["base"], [0, 0, 0]],
            [["lid"], [0, 0, -1]],
            [["pin"], [-1, 0, 0]]
        ]]
    ]);
    instance("base", "box") box_main();
    instance("lid", "lid") translate([0, 0, lid_z]) lid_main();
    instance("pin", "pin") translate([75.2, hinge_y, hinge_z]) rotate([0, -90, 0]) pin_geom();
}
